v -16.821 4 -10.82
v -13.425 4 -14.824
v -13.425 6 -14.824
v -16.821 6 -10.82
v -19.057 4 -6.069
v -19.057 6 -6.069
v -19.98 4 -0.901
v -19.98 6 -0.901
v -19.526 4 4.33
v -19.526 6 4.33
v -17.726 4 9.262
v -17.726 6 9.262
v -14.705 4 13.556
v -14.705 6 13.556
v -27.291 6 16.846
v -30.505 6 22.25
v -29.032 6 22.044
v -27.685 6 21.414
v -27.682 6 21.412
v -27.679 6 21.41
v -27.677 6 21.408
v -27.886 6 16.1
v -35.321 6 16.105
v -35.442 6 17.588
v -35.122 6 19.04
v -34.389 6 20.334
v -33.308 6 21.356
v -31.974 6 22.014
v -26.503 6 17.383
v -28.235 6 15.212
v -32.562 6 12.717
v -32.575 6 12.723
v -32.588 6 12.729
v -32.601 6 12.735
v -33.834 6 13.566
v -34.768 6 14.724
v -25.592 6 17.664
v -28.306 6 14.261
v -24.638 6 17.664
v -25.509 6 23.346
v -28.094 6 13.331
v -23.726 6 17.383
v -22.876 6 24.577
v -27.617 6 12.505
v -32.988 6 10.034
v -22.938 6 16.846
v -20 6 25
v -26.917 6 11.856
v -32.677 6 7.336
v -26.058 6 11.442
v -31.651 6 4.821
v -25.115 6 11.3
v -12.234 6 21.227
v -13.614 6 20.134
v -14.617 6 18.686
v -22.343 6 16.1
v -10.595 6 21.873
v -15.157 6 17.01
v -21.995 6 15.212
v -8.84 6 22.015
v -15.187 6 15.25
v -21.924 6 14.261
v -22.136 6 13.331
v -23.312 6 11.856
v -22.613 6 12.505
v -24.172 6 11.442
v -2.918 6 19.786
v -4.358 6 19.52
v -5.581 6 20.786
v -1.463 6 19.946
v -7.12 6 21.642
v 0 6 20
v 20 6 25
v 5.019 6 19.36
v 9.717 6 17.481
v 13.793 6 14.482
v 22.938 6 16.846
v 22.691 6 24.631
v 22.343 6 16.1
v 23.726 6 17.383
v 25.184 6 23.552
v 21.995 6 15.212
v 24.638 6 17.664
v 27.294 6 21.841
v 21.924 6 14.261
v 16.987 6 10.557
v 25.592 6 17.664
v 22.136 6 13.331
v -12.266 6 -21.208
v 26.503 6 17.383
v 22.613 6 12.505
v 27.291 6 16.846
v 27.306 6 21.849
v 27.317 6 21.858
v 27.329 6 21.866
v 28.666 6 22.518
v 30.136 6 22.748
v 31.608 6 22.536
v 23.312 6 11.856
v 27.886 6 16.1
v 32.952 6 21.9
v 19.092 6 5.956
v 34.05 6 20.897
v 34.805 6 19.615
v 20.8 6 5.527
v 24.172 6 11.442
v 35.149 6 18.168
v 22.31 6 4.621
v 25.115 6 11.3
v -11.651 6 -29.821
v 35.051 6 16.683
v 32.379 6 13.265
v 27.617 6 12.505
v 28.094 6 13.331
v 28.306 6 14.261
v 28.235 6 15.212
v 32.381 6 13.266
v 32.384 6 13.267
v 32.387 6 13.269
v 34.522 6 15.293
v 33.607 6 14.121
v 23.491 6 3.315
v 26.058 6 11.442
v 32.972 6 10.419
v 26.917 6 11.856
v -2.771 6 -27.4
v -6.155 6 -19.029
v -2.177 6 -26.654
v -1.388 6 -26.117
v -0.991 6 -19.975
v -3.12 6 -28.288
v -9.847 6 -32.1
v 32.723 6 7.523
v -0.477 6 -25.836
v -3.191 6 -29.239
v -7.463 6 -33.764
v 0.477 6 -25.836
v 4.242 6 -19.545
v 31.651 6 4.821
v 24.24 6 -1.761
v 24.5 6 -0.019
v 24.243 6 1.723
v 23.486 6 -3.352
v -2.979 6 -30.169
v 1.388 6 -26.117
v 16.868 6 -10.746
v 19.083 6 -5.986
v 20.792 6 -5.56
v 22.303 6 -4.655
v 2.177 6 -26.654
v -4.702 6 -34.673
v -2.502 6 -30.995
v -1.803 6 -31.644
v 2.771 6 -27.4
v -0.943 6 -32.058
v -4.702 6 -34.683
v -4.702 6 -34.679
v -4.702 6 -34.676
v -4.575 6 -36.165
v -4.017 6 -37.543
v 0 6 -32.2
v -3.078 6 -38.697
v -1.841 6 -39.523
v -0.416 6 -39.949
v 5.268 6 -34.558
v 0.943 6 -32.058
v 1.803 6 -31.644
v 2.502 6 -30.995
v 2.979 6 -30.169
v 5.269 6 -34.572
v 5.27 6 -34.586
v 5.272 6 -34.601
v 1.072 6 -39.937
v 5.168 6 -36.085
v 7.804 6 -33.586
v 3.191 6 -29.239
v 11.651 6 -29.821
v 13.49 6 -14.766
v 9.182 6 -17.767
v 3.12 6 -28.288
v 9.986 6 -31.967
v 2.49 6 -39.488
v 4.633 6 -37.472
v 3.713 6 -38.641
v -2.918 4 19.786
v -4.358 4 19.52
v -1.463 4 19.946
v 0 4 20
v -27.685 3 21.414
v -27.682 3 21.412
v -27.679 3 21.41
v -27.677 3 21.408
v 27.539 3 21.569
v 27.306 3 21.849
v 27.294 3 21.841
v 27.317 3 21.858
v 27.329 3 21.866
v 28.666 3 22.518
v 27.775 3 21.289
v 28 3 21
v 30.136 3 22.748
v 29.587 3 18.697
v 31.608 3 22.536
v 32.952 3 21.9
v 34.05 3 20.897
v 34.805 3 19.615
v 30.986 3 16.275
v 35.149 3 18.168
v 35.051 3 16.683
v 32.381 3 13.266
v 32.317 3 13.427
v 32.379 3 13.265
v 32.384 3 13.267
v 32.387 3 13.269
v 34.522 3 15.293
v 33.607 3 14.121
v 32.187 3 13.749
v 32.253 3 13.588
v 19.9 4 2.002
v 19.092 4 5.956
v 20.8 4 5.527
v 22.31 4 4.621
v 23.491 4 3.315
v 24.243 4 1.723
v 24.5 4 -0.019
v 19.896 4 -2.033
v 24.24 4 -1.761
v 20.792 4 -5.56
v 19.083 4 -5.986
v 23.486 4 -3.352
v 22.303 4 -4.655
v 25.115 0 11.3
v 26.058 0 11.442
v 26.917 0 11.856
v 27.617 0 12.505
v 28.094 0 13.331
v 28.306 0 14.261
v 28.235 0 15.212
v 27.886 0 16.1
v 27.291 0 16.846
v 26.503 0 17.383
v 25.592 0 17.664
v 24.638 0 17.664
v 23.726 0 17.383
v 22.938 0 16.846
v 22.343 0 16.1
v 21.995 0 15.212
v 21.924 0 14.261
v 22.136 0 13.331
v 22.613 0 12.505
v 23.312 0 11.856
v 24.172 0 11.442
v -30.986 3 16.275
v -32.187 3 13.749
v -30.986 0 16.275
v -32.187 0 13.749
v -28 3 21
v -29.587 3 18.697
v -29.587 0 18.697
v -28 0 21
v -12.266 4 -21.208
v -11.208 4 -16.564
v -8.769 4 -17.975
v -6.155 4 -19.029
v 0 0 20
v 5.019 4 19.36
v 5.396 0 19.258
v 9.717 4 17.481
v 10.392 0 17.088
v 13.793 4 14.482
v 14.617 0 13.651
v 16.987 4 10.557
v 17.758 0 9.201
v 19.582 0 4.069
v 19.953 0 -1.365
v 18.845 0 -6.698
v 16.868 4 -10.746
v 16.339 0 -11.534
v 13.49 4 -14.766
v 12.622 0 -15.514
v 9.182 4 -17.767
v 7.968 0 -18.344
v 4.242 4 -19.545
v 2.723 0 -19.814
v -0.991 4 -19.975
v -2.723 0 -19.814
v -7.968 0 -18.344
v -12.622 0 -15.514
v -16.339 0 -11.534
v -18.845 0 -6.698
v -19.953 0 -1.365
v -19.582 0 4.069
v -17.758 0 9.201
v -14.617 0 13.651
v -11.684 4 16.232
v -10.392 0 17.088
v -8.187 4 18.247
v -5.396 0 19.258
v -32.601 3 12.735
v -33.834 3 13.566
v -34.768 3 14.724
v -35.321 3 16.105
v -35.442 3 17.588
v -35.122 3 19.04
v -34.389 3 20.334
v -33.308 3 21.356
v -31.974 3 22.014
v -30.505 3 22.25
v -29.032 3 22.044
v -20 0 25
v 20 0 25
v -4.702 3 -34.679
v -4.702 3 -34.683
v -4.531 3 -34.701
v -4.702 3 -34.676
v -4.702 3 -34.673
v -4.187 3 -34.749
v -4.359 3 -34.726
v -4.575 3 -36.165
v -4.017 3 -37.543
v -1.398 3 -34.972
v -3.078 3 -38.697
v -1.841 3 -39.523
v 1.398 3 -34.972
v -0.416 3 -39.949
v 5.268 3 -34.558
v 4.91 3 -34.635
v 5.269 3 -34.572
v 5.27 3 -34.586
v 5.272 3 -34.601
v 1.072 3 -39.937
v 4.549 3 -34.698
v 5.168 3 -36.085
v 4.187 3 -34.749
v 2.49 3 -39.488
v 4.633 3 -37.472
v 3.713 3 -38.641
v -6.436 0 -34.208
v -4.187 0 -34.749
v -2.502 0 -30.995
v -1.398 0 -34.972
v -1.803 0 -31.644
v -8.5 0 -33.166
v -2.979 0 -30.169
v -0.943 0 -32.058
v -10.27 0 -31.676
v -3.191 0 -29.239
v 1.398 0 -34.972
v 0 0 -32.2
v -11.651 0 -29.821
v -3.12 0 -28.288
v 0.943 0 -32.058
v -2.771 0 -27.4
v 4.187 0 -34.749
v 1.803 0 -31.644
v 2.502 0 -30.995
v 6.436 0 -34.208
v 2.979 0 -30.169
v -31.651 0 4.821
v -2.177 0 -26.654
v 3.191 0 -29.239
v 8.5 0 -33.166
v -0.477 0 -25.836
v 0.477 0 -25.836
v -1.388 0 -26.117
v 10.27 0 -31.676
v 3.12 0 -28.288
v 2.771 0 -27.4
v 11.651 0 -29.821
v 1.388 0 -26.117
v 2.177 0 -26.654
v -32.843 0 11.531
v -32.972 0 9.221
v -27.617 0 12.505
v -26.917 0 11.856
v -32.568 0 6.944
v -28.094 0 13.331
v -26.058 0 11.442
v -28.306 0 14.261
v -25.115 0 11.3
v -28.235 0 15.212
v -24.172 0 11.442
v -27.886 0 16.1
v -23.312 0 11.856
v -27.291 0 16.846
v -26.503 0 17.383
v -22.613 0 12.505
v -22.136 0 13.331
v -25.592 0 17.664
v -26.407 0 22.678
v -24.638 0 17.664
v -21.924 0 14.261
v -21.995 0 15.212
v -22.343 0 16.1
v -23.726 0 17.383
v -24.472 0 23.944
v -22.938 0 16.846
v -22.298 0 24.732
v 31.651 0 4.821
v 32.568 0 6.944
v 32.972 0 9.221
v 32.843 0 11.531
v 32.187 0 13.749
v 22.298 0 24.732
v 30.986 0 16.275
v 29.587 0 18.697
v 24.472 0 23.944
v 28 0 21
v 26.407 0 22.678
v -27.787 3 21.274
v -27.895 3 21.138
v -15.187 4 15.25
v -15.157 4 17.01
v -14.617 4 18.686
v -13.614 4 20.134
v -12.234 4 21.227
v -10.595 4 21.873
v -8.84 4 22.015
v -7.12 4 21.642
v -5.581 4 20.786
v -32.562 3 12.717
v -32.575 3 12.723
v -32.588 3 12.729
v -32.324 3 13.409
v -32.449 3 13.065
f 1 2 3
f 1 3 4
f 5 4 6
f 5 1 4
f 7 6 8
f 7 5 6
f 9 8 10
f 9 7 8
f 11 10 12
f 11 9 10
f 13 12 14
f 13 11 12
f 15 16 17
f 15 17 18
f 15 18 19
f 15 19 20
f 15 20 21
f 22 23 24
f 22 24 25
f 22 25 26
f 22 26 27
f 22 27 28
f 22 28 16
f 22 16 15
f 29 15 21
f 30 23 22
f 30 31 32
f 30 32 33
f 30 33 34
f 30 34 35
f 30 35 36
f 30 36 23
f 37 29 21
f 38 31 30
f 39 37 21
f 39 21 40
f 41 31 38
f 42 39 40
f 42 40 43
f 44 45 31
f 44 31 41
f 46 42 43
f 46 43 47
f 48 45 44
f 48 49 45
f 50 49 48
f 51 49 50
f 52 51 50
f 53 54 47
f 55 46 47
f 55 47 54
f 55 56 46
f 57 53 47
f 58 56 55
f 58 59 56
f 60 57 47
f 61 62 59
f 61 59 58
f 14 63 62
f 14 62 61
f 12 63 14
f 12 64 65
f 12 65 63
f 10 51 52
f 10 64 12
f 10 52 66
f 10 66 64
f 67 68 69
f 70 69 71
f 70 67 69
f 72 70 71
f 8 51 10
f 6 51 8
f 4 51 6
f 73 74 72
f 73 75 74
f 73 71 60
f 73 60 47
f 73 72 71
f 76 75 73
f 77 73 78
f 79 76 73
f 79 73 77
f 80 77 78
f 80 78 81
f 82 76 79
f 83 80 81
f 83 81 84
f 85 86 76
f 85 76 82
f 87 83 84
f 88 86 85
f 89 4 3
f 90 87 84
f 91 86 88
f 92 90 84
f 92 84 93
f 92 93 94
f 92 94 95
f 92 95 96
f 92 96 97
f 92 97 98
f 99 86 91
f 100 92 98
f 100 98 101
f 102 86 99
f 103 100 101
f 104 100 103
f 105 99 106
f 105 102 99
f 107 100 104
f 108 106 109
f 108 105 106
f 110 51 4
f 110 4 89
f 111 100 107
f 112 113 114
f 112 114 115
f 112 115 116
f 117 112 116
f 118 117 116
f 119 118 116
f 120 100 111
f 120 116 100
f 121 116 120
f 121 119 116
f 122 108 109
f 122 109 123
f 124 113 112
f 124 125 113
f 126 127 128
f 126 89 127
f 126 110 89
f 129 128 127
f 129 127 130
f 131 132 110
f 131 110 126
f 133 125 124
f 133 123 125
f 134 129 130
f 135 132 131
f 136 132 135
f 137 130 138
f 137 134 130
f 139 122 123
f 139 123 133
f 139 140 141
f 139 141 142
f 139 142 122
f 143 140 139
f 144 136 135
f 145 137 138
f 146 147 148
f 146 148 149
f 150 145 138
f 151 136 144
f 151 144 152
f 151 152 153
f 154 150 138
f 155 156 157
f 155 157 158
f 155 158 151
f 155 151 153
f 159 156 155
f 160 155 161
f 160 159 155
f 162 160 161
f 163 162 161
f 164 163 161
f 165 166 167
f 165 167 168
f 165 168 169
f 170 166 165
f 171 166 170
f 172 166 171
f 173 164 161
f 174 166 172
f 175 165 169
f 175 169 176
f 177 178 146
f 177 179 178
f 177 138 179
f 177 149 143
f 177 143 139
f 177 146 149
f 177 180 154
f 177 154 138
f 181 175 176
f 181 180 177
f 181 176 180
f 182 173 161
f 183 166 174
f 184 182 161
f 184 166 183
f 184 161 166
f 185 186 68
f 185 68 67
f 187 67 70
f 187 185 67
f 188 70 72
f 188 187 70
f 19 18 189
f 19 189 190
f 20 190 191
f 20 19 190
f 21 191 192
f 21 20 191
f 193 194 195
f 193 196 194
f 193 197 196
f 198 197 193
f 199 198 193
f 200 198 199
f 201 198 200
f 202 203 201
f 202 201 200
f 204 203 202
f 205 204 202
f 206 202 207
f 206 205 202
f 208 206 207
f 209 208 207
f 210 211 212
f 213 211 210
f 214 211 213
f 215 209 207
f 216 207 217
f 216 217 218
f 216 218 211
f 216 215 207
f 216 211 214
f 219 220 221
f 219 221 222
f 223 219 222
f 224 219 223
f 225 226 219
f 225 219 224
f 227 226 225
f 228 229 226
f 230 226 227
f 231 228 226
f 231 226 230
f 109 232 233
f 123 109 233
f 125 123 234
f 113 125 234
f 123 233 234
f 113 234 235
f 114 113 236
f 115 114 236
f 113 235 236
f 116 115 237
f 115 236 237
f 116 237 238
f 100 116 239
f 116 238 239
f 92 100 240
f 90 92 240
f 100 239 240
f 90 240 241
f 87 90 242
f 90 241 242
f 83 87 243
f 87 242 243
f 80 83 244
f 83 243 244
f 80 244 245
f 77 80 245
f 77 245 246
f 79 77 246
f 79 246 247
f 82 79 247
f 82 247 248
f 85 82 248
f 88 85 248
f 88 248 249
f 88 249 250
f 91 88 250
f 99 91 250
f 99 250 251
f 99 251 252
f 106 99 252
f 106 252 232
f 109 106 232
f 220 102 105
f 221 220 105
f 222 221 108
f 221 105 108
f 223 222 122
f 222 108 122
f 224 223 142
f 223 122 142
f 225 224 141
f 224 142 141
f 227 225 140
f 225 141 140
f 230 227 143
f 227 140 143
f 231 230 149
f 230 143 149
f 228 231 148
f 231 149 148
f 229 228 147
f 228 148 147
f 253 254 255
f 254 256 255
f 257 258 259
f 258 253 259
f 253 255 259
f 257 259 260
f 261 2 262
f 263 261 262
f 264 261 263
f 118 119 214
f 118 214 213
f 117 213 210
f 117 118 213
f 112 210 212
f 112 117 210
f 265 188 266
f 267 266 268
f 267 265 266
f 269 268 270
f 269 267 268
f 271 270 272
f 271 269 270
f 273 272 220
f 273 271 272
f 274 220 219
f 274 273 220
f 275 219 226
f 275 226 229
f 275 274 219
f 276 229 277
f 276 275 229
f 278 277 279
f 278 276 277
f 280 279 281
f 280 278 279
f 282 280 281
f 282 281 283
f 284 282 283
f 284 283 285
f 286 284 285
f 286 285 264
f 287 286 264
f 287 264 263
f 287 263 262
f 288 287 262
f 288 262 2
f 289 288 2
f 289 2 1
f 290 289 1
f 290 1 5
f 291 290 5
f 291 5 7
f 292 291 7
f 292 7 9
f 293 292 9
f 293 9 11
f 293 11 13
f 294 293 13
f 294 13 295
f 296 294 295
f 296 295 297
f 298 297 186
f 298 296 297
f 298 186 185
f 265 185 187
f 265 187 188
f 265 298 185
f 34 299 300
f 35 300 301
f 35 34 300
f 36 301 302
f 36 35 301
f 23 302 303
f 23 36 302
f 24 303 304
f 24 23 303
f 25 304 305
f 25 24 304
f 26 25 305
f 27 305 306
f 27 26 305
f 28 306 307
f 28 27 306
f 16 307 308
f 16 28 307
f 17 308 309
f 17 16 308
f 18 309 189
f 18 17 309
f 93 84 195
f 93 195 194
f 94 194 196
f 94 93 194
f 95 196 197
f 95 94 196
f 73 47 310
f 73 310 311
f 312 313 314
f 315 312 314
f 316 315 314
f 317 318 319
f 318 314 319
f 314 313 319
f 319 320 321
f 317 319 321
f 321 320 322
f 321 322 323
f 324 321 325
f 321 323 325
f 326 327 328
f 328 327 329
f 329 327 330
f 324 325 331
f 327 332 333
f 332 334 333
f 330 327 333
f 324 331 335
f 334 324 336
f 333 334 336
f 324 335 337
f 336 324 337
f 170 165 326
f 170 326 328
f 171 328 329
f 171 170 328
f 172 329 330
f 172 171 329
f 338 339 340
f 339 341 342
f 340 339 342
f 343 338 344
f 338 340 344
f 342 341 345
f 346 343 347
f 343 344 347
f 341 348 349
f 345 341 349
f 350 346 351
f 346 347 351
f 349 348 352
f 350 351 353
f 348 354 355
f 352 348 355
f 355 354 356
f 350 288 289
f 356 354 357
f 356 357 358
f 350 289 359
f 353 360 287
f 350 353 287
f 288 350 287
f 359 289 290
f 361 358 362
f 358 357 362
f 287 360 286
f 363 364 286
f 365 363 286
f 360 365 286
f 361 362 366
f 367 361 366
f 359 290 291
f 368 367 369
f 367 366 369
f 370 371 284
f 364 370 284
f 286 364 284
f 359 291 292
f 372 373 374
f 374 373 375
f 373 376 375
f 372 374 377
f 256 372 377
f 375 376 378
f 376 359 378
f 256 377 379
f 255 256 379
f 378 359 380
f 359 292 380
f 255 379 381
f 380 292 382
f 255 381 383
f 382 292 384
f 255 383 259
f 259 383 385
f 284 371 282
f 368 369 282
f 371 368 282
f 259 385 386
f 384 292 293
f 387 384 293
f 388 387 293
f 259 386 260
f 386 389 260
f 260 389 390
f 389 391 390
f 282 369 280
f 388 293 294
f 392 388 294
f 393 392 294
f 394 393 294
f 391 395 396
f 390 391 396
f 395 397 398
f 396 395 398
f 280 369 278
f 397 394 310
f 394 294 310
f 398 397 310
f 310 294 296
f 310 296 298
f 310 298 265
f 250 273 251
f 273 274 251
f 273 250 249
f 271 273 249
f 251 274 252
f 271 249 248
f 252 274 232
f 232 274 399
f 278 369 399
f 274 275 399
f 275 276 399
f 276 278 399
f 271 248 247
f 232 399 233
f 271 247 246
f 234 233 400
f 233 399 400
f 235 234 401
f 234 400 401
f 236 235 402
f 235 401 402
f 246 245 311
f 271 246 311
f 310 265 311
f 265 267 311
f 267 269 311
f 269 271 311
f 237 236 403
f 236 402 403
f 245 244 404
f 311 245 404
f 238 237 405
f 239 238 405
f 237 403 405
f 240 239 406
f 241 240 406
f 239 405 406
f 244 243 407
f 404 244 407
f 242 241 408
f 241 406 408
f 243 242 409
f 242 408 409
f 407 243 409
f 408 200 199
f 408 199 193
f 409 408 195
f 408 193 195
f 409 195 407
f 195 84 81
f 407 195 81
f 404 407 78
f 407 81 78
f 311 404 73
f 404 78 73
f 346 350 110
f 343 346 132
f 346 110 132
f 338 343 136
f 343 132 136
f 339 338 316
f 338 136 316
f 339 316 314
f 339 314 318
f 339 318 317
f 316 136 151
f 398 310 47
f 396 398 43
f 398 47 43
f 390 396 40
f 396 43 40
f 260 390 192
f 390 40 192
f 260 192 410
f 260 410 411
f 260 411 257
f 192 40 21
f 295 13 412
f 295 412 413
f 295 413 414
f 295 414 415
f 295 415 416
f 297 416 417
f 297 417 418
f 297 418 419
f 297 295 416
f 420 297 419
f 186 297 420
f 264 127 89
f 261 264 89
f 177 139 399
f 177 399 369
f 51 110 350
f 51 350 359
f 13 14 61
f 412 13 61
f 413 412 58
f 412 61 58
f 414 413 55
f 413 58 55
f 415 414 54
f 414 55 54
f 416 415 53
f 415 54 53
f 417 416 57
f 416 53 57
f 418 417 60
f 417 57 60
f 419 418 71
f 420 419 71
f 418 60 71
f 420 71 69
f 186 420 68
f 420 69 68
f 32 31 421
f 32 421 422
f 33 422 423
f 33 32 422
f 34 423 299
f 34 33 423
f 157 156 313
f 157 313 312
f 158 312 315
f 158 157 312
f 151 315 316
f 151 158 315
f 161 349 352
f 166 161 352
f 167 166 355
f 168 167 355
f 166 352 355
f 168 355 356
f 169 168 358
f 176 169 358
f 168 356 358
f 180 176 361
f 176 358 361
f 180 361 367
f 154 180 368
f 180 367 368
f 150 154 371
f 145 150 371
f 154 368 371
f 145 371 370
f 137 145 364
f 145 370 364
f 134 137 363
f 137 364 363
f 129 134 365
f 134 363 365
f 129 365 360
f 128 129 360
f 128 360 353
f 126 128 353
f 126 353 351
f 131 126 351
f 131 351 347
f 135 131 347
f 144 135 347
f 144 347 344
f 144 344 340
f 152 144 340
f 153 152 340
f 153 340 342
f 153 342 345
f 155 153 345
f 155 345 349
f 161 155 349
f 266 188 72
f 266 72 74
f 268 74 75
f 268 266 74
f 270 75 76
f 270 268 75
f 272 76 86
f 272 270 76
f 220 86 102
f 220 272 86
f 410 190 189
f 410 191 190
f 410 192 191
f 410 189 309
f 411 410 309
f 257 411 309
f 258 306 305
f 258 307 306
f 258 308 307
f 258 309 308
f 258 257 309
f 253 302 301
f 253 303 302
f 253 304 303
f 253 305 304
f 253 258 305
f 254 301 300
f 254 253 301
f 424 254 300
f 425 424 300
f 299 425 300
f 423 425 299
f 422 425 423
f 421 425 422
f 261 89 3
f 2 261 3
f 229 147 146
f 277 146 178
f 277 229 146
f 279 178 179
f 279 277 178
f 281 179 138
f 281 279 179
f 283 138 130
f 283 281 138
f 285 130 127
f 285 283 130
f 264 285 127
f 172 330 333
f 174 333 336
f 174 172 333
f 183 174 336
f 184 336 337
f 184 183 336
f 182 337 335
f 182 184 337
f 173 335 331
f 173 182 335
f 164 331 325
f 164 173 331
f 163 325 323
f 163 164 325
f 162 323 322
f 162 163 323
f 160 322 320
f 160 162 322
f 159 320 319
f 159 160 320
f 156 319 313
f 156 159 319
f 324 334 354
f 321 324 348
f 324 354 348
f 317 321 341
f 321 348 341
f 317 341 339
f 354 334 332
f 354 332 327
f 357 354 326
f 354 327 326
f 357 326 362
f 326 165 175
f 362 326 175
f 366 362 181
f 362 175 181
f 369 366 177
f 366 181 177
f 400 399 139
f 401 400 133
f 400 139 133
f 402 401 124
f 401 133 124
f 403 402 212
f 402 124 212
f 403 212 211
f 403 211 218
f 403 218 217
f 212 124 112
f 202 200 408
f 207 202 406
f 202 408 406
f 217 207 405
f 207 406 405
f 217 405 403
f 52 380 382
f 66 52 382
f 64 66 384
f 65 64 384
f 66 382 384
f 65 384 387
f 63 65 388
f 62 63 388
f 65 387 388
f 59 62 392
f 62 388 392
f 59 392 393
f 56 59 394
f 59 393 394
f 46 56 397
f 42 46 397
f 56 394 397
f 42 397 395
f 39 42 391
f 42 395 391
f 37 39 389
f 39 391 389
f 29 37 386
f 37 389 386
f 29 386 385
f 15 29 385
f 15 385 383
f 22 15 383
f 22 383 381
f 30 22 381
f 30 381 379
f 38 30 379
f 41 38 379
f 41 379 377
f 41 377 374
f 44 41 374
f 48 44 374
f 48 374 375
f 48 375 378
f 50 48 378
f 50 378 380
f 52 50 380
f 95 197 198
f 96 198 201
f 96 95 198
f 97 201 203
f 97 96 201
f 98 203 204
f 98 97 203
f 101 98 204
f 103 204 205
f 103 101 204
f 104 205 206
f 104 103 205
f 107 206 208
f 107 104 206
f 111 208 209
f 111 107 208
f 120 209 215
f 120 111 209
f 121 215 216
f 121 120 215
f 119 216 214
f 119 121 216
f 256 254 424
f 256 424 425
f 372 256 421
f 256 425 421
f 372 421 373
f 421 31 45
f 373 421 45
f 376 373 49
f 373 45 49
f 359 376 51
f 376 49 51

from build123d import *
from build123d.topology import SkipClean

# Parameters (mm, degrees)
SKETCH1_R           = 18.5
BOSS_EXTRUDE1_DEPTH = 3.5
SKETCH2_R           = 35
SKETCH2_R_2         = 20
SKETCH2_R_3         = 2.8
BOSS_EXTRUDE2_DEPTH = 6
SKETCH5_R           = 5
BOSS_EXTRUDE4_DEPTH = 3
CUT_EXTRUDE1_START  = -10
SKETCH3_R           = 18.5
CUT_EXTRUDE1_DEPTH  = 10
SKETCH12_R          = 72.135852014
CUT_EXTRUDE2_DEPTH  = 22
FILLET1_R           = 10
SKETCH15_R          = 20
SKETCH15_R_2        = 6
CUT_EXTRUDE4_DEPTH  = 2
SKETCH4_R           = 3.2
CUT_EXTRUDE5_DEPTH  = 10


with BuildPart() as part:
    # Sketch1 → Boss-Extrude1 (new body)
    with BuildSketch(Plane(origin=(0, 0, 0), x_dir=(1, 0, 0), z_dir=(0, 1, 0))):
        with Locations(Location((0, 0, 0), (0, 0, 270))):
            Circle(SKETCH1_R)
    extrude(amount=BOSS_EXTRUDE1_DEPTH)

    # Sketch3 → Cut-Extrude1 (cut)
    with BuildSketch(Plane(origin=(0, 3.5, 0), x_dir=(1, 0, 0), z_dir=(0, 1, 0)).offset(CUT_EXTRUDE1_START)):
        Circle(SKETCH3_R)
    extrude(amount=CUT_EXTRUDE1_DEPTH, mode=Mode.SUBTRACT)


with BuildPart() as body_2:
    # Sketch2 → Boss-Extrude2 (new body)
    with BuildSketch(Plane(origin=(0, 0, 0), x_dir=(1, 0, 0), z_dir=(0, 1, 0))):
        with Locations(Location((0, 0, 0), (0, 0, 270))):
            Circle(SKETCH2_R)
        with Locations(Location((0, 0, 0), (0, 0, 270))):
            Circle(SKETCH2_R_2, mode=Mode.SUBTRACT)
        with Locations(Location((0, 29, 0), (0, 0, 270))):
            Circle(SKETCH2_R_3, mode=Mode.SUBTRACT)
        with Locations(Location((25.11473671, -14.5, 0), (0, 0, 270))):
            Circle(SKETCH2_R_3, mode=Mode.SUBTRACT)
        with Locations(Location((-25.11473671, -14.5, 0), (0, 0, 270))):
            Circle(SKETCH2_R_3, mode=Mode.SUBTRACT)
    extrude(amount=BOSS_EXTRUDE2_DEPTH)

    # Sketch5 → Boss-Extrude4 (add)
    with BuildSketch(Plane(origin=(0, 6, 0), x_dir=(1, 0, 0), z_dir=(0, 1, 0))):
        with Locations((-30.453629482, -17.250404383)):
            Circle(SKETCH5_R)
        with Locations((0.28752632, 34.99881896)):
            Circle(SKETCH5_R)
        with Locations((30.166103162, -17.748414577)):
            Circle(SKETCH5_R)
    extrude(amount=-BOSS_EXTRUDE4_DEPTH)

    # Sketch12 → Cut-Extrude2 (cut)
    with BuildSketch(Plane(origin=(0, 6, 0), x_dir=(1, 0, 0), z_dir=(0, 1, 0))):
        Circle(SKETCH12_R)
        Polygon((0, 50), (-43.301270189, -25), (43.301270189, -25), align=None, mode=Mode.SUBTRACT)
    extrude(amount=-CUT_EXTRUDE2_DEPTH, mode=Mode.SUBTRACT)

    # Fillet1
    # the kernel refuses this fillet: 10 mm, written as the material it takes off along each edge
    with BuildSketch(Plane(origin=(-24.494897428, 19.2960859, 25), x_dir=(-0.6590478202651217, 0, -0.7521010374968192), z_dir=(0, -1, 0))) as fillet1_piece_1_section:
        with BuildLine():
            CenterArc((4.558658023, 9.971095222), FILLET1_R, 221.227294524, 53.130102354)
            Line((-2.962352352, 3.380617019), (0, 0))
            ThreePointArc((0, 0), (2.65921718, -0.101166725), (5.31843436, 0))
        make_face()
    fillet1_piece_1 = extrude(amount=32.5921718, mode=Mode.PRIVATE)
    fillet1_piece_1 = fillet1_piece_1 - Plane(origin=(-30.453629482, 4.5, 17.250404383), x_dir=(1, 0, 0), z_dir=(0, 1, 0)) * Cylinder(5, 87, mode=Mode.PRIVATE)
    add(fillet1_piece_1, mode=Mode.SUBTRACT)
    with BuildSketch(Plane(origin=(-24.494897428, 19.2960859, 25), x_dir=(-0.6590478202651217, 0, -0.7521010374968192), z_dir=(0, -1, 0))) as fillet1_piece_2_section:
        with BuildLine():
            CenterArc((4.558658023, 9.971095222), FILLET1_R, 221.227294524, 53.130102354)
            Line((-2.962352352, 3.380617019), (0, 0))
            ThreePointArc((0, 0), (2.65921718, -0.101166725), (5.31843436, 0))
        make_face()
    fillet1_piece_2 = extrude(amount=32.5921718, mode=Mode.PRIVATE)
    fillet1_piece_2 = split(fillet1_piece_2, bisect_by=Plane(origin=(-27.761621835, 3, 21.309124186), z_dir=(0, -1, 0)), keep=Keep.TOP, mode=Mode.PRIVATE)
    add(fillet1_piece_2, mode=Mode.SUBTRACT)
    with BuildSketch(Plane(origin=(24.494897428, 19.2960859, 25), x_dir=(-1, 0, 0), z_dir=(0, -1, 0))) as fillet1_piece_3_section:
        with BuildLine():
            CenterArc((4.494897428, 10), FILLET1_R, 216.869897646, 53.130102354)
            ThreePointArc((-3.505102572, 4), (-1.828638885, 1.933326291), (0, 0))
            Line((0, 0), (4.494897428, 0))
        make_face()
    fillet1_piece_3 = extrude(amount=32.5921718, mode=Mode.PRIVATE)
    fillet1_piece_3 = fillet1_piece_3 - Plane(origin=(30.166103162, 4.5, 17.748414577), x_dir=(1, 0, 0), z_dir=(0, 1, 0)) * Cylinder(5, 84, mode=Mode.PRIVATE)
    add(fillet1_piece_3, mode=Mode.SUBTRACT)
    with BuildSketch(Plane(origin=(24.494897428, 19.2960859, 25), x_dir=(-1, 0, 0), z_dir=(0, -1, 0))) as fillet1_piece_4_section:
        with BuildLine():
            CenterArc((4.494897428, 10), FILLET1_R, 216.869897646, 53.130102354)
            ThreePointArc((-3.505102572, 4), (-1.828638885, 1.933326291), (0, 0))
            Line((0, 0), (4.494897428, 0))
        make_face()
    fillet1_piece_4 = extrude(amount=32.5921718, mode=Mode.PRIVATE)
    fillet1_piece_4 = split(fillet1_piece_4, bisect_by=Plane(origin=(27.488157838, 3, 21.643747381), z_dir=(0, -1, 0)), keep=Keep.TOP, mode=Mode.PRIVATE)
    add(fillet1_piece_4, mode=Mode.SUBTRACT)
    with BuildSketch(Plane(origin=(-9.403186381, 19.2960859, -33.713203436), x_dir=(-0.5000000000000003, 0, 0.8660254037844386), z_dir=(0, -1, 0))) as fillet1_piece_5_section:
        with BuildLine():
            CenterArc((4.494897428, -10), FILLET1_R, 90, 53.130102354)
            ThreePointArc((-3.505102572, -4), (-1.828638885, -1.933326291), (0, 0))
            Line((0, 0), (4.494897428, 0))
        make_face()
    fillet1_piece_5 = extrude(amount=32.5921718, mode=Mode.PRIVATE)
    fillet1_piece_5 = fillet1_piece_5 - Plane(origin=(0.28752632, 4.5, -34.99881896), x_dir=(1, 0, 0), z_dir=(0, 1, 0)) * Cylinder(5, 84, mode=Mode.PRIVATE)
    add(fillet1_piece_5, mode=Mode.SUBTRACT)
    with BuildSketch(Plane(origin=(-9.403186381, 19.2960859, -33.713203436), x_dir=(-0.5000000000000003, 0, 0.8660254037844386), z_dir=(0, -1, 0))) as fillet1_piece_6_section:
        with BuildLine():
            CenterArc((4.494897428, -10), FILLET1_R, 90, 53.130102354)
            ThreePointArc((-3.505102572, -4), (-1.828638885, -1.933326291), (0, 0))
            Line((0, 0), (4.494897428, 0))
        make_face()
    fillet1_piece_6 = extrude(amount=32.5921718, mode=Mode.PRIVATE)
    fillet1_piece_6 = split(fillet1_piece_6, bisect_by=Plane(origin=(-4.57343196, 3, -34.696831852), z_dir=(0, -1, 0)), keep=Keep.TOP, mode=Mode.PRIVATE)
    add(fillet1_piece_6, mode=Mode.SUBTRACT)
    with BuildSketch(Plane(origin=(-33.898083809, 19.2960859, 8.713203436), x_dir=(0.32181469455231854, 0, 0.9468026734067654), z_dir=(0, -1, 0))) as fillet1_piece_7_section:
        with BuildLine():
            CenterArc((4.558658023, -9.971095222), FILLET1_R, 85.642603122, 53.130102354)
            Line((-2.962352352, -3.380617019), (0, 0))
            ThreePointArc((0, 0), (2.65921718, 0.101166725), (5.31843436, 0))
        make_face()
    fillet1_piece_7 = extrude(amount=32.5921718, mode=Mode.PRIVATE)
    fillet1_piece_7 = fillet1_piece_7 - Plane(origin=(-30.453629482, 4.5, 17.250404383), x_dir=(1, 0, 0), z_dir=(0, 1, 0)) * Cylinder(5, 87, mode=Mode.PRIVATE)
    add(fillet1_piece_7, mode=Mode.SUBTRACT)
    with BuildSketch(Plane(origin=(-33.898083809, 19.2960859, 8.713203436), x_dir=(0.32181469455231854, 0, 0.9468026734067654), z_dir=(0, -1, 0))) as fillet1_piece_8_section:
        with BuildLine():
            CenterArc((4.558658023, -9.971095222), FILLET1_R, 85.642603122, 53.130102354)
            Line((-2.962352352, -3.380617019), (0, 0))
            ThreePointArc((0, 0), (2.65921718, 0.101166725), (5.31843436, 0))
        make_face()
    fillet1_piece_8 = extrude(amount=32.5921718, mode=Mode.PRIVATE)
    fillet1_piece_8 = split(fillet1_piece_8, bisect_by=Plane(origin=(-32.488113984, 3, 12.9835693), z_dir=(0, -1, 0)), keep=Keep.TOP, mode=Mode.PRIVATE)
    add(fillet1_piece_8, mode=Mode.SUBTRACT)
    with BuildSketch(Plane(origin=(33.898083809, 19.2960859, 8.713203436), x_dir=(-0.3218146945523175, 0, 0.9468026734067657), z_dir=(0, -1, 0))) as fillet1_piece_9_section:
        with BuildLine():
            CenterArc((4.558658023, 9.971095222), FILLET1_R, 221.227294524, 53.130102354)
            Line((-2.962352352, 3.380617019), (0, 0))
            ThreePointArc((0, 0), (2.65921718, -0.101166725), (5.31843436, 0))
        make_face()
    fillet1_piece_9 = extrude(amount=32.5921718, mode=Mode.PRIVATE)
    fillet1_piece_9 = fillet1_piece_9 - Plane(origin=(30.166103162, 4.5, 17.748414577), x_dir=(1, 0, 0), z_dir=(0, 1, 0)) * Cylinder(5, 87, mode=Mode.PRIVATE)
    add(fillet1_piece_9, mode=Mode.SUBTRACT)
    with BuildSketch(Plane(origin=(33.898083809, 19.2960859, 8.713203436), x_dir=(-0.3218146945523175, 0, 0.9468026734067657), z_dir=(0, -1, 0))) as fillet1_piece_10_section:
        with BuildLine():
            CenterArc((4.558658023, 9.971095222), FILLET1_R, 221.227294524, 53.130102354)
            Line((-2.962352352, 3.380617019), (0, 0))
            ThreePointArc((0, 0), (2.65921718, -0.101166725), (5.31843436, 0))
        make_face()
    fillet1_piece_10 = extrude(amount=32.5921718, mode=Mode.PRIVATE)
    fillet1_piece_10 = split(fillet1_piece_10, bisect_by=Plane(origin=(32.335053795, 3, 13.387707666), z_dir=(0, -1, 0)), keep=Keep.TOP, mode=Mode.PRIVATE)
    add(fillet1_piece_10, mode=Mode.SUBTRACT)
    with BuildSketch(Plane(origin=(9.403186381, 19.2960859, -33.713203436), x_dir=(-0.9808625148174394, 0, -0.19470163590994477), z_dir=(0, -1, 0))) as fillet1_piece_11_section:
        with BuildLine():
            CenterArc((4.558658023, -9.971095222), FILLET1_R, 85.642603122, 53.130102354)
            Line((-2.962352352, -3.380617019), (0, 0))
            ThreePointArc((0, 0), (2.65921718, 0.101166725), (5.31843436, 0))
        make_face()
    fillet1_piece_11 = extrude(amount=32.5921718, mode=Mode.PRIVATE)
    fillet1_piece_11 = fillet1_piece_11 - Plane(origin=(0.28752632, 4.5, -34.99881896), x_dir=(1, 0, 0), z_dir=(0, 1, 0)) * Cylinder(5, 87, mode=Mode.PRIVATE)
    add(fillet1_piece_11, mode=Mode.SUBTRACT)
    with BuildSketch(Plane(origin=(9.403186381, 19.2960859, -33.713203436), x_dir=(-0.9808625148174394, 0, -0.19470163590994477), z_dir=(0, -1, 0))) as fillet1_piece_12_section:
        with BuildLine():
            CenterArc((4.558658023, -9.971095222), FILLET1_R, 85.642603122, 53.130102354)
            Line((-2.962352352, -3.380617019), (0, 0))
            ThreePointArc((0, 0), (2.65921718, 0.101166725), (5.31843436, 0))
        make_face()
    fillet1_piece_12 = extrude(amount=32.5921718, mode=Mode.PRIVATE)
    fillet1_piece_12 = split(fillet1_piece_12, bisect_by=Plane(origin=(4.999956146, 3, -34.627316681), z_dir=(0, -1, 0)), keep=Keep.TOP, mode=Mode.PRIVATE)
    add(fillet1_piece_12, mode=Mode.SUBTRACT)

    # Sketch15 → Cut-Extrude4 (cut)
    with SkipClean():  # the faces are left unmerged after this step: merging them gives an invalid solid
        with BuildSketch(Plane(origin=(0, 6, 0), x_dir=(1, 0, 0), z_dir=(0, 1, 0))):
            with Locations(Location((0, 0, 0), (0, 0, 107.923924211))):
                Circle(SKETCH15_R)
            with Locations((-9.237551188, -16.028650849)):
                Circle(SKETCH15_R_2)
            with Locations((18.499994418, 0.014371427)):
                Circle(SKETCH15_R_2)
            with BuildLine():
                Line((-12.266478871, 21.208099776), (-13.42538307, 14.824273656))
                ThreePointArc((-13.42538307, 14.824273656), (-10.01345214, 17.312734511), (-6.155078704, 19.029319645))
                Line((-6.155078704, 19.029319645), (-12.266478871, 21.208099776))
            make_face()
        extrude(amount=-CUT_EXTRUDE4_DEPTH, mode=Mode.SUBTRACT)

    # Sketch4 → Cut-Extrude5 (cut)
    with SkipClean():  # the faces are left unmerged after this step: merging them gives an invalid solid
        with BuildSketch(Plane.XZ):
            with Locations(Location((-25.11473671, 14.5, 0), (0, 0, 270))):
                Circle(SKETCH4_R)
            with Locations(Location((25.11473671, 14.5, 0), (0, 0, 270))):
                Circle(SKETCH4_R)
            with Locations(Location((0, -29, 0), (0, 0, 270))):
                Circle(SKETCH4_R)
        extrude(amount=-CUT_EXTRUDE5_DEPTH, mode=Mode.SUBTRACT)


solid = body_2.part
